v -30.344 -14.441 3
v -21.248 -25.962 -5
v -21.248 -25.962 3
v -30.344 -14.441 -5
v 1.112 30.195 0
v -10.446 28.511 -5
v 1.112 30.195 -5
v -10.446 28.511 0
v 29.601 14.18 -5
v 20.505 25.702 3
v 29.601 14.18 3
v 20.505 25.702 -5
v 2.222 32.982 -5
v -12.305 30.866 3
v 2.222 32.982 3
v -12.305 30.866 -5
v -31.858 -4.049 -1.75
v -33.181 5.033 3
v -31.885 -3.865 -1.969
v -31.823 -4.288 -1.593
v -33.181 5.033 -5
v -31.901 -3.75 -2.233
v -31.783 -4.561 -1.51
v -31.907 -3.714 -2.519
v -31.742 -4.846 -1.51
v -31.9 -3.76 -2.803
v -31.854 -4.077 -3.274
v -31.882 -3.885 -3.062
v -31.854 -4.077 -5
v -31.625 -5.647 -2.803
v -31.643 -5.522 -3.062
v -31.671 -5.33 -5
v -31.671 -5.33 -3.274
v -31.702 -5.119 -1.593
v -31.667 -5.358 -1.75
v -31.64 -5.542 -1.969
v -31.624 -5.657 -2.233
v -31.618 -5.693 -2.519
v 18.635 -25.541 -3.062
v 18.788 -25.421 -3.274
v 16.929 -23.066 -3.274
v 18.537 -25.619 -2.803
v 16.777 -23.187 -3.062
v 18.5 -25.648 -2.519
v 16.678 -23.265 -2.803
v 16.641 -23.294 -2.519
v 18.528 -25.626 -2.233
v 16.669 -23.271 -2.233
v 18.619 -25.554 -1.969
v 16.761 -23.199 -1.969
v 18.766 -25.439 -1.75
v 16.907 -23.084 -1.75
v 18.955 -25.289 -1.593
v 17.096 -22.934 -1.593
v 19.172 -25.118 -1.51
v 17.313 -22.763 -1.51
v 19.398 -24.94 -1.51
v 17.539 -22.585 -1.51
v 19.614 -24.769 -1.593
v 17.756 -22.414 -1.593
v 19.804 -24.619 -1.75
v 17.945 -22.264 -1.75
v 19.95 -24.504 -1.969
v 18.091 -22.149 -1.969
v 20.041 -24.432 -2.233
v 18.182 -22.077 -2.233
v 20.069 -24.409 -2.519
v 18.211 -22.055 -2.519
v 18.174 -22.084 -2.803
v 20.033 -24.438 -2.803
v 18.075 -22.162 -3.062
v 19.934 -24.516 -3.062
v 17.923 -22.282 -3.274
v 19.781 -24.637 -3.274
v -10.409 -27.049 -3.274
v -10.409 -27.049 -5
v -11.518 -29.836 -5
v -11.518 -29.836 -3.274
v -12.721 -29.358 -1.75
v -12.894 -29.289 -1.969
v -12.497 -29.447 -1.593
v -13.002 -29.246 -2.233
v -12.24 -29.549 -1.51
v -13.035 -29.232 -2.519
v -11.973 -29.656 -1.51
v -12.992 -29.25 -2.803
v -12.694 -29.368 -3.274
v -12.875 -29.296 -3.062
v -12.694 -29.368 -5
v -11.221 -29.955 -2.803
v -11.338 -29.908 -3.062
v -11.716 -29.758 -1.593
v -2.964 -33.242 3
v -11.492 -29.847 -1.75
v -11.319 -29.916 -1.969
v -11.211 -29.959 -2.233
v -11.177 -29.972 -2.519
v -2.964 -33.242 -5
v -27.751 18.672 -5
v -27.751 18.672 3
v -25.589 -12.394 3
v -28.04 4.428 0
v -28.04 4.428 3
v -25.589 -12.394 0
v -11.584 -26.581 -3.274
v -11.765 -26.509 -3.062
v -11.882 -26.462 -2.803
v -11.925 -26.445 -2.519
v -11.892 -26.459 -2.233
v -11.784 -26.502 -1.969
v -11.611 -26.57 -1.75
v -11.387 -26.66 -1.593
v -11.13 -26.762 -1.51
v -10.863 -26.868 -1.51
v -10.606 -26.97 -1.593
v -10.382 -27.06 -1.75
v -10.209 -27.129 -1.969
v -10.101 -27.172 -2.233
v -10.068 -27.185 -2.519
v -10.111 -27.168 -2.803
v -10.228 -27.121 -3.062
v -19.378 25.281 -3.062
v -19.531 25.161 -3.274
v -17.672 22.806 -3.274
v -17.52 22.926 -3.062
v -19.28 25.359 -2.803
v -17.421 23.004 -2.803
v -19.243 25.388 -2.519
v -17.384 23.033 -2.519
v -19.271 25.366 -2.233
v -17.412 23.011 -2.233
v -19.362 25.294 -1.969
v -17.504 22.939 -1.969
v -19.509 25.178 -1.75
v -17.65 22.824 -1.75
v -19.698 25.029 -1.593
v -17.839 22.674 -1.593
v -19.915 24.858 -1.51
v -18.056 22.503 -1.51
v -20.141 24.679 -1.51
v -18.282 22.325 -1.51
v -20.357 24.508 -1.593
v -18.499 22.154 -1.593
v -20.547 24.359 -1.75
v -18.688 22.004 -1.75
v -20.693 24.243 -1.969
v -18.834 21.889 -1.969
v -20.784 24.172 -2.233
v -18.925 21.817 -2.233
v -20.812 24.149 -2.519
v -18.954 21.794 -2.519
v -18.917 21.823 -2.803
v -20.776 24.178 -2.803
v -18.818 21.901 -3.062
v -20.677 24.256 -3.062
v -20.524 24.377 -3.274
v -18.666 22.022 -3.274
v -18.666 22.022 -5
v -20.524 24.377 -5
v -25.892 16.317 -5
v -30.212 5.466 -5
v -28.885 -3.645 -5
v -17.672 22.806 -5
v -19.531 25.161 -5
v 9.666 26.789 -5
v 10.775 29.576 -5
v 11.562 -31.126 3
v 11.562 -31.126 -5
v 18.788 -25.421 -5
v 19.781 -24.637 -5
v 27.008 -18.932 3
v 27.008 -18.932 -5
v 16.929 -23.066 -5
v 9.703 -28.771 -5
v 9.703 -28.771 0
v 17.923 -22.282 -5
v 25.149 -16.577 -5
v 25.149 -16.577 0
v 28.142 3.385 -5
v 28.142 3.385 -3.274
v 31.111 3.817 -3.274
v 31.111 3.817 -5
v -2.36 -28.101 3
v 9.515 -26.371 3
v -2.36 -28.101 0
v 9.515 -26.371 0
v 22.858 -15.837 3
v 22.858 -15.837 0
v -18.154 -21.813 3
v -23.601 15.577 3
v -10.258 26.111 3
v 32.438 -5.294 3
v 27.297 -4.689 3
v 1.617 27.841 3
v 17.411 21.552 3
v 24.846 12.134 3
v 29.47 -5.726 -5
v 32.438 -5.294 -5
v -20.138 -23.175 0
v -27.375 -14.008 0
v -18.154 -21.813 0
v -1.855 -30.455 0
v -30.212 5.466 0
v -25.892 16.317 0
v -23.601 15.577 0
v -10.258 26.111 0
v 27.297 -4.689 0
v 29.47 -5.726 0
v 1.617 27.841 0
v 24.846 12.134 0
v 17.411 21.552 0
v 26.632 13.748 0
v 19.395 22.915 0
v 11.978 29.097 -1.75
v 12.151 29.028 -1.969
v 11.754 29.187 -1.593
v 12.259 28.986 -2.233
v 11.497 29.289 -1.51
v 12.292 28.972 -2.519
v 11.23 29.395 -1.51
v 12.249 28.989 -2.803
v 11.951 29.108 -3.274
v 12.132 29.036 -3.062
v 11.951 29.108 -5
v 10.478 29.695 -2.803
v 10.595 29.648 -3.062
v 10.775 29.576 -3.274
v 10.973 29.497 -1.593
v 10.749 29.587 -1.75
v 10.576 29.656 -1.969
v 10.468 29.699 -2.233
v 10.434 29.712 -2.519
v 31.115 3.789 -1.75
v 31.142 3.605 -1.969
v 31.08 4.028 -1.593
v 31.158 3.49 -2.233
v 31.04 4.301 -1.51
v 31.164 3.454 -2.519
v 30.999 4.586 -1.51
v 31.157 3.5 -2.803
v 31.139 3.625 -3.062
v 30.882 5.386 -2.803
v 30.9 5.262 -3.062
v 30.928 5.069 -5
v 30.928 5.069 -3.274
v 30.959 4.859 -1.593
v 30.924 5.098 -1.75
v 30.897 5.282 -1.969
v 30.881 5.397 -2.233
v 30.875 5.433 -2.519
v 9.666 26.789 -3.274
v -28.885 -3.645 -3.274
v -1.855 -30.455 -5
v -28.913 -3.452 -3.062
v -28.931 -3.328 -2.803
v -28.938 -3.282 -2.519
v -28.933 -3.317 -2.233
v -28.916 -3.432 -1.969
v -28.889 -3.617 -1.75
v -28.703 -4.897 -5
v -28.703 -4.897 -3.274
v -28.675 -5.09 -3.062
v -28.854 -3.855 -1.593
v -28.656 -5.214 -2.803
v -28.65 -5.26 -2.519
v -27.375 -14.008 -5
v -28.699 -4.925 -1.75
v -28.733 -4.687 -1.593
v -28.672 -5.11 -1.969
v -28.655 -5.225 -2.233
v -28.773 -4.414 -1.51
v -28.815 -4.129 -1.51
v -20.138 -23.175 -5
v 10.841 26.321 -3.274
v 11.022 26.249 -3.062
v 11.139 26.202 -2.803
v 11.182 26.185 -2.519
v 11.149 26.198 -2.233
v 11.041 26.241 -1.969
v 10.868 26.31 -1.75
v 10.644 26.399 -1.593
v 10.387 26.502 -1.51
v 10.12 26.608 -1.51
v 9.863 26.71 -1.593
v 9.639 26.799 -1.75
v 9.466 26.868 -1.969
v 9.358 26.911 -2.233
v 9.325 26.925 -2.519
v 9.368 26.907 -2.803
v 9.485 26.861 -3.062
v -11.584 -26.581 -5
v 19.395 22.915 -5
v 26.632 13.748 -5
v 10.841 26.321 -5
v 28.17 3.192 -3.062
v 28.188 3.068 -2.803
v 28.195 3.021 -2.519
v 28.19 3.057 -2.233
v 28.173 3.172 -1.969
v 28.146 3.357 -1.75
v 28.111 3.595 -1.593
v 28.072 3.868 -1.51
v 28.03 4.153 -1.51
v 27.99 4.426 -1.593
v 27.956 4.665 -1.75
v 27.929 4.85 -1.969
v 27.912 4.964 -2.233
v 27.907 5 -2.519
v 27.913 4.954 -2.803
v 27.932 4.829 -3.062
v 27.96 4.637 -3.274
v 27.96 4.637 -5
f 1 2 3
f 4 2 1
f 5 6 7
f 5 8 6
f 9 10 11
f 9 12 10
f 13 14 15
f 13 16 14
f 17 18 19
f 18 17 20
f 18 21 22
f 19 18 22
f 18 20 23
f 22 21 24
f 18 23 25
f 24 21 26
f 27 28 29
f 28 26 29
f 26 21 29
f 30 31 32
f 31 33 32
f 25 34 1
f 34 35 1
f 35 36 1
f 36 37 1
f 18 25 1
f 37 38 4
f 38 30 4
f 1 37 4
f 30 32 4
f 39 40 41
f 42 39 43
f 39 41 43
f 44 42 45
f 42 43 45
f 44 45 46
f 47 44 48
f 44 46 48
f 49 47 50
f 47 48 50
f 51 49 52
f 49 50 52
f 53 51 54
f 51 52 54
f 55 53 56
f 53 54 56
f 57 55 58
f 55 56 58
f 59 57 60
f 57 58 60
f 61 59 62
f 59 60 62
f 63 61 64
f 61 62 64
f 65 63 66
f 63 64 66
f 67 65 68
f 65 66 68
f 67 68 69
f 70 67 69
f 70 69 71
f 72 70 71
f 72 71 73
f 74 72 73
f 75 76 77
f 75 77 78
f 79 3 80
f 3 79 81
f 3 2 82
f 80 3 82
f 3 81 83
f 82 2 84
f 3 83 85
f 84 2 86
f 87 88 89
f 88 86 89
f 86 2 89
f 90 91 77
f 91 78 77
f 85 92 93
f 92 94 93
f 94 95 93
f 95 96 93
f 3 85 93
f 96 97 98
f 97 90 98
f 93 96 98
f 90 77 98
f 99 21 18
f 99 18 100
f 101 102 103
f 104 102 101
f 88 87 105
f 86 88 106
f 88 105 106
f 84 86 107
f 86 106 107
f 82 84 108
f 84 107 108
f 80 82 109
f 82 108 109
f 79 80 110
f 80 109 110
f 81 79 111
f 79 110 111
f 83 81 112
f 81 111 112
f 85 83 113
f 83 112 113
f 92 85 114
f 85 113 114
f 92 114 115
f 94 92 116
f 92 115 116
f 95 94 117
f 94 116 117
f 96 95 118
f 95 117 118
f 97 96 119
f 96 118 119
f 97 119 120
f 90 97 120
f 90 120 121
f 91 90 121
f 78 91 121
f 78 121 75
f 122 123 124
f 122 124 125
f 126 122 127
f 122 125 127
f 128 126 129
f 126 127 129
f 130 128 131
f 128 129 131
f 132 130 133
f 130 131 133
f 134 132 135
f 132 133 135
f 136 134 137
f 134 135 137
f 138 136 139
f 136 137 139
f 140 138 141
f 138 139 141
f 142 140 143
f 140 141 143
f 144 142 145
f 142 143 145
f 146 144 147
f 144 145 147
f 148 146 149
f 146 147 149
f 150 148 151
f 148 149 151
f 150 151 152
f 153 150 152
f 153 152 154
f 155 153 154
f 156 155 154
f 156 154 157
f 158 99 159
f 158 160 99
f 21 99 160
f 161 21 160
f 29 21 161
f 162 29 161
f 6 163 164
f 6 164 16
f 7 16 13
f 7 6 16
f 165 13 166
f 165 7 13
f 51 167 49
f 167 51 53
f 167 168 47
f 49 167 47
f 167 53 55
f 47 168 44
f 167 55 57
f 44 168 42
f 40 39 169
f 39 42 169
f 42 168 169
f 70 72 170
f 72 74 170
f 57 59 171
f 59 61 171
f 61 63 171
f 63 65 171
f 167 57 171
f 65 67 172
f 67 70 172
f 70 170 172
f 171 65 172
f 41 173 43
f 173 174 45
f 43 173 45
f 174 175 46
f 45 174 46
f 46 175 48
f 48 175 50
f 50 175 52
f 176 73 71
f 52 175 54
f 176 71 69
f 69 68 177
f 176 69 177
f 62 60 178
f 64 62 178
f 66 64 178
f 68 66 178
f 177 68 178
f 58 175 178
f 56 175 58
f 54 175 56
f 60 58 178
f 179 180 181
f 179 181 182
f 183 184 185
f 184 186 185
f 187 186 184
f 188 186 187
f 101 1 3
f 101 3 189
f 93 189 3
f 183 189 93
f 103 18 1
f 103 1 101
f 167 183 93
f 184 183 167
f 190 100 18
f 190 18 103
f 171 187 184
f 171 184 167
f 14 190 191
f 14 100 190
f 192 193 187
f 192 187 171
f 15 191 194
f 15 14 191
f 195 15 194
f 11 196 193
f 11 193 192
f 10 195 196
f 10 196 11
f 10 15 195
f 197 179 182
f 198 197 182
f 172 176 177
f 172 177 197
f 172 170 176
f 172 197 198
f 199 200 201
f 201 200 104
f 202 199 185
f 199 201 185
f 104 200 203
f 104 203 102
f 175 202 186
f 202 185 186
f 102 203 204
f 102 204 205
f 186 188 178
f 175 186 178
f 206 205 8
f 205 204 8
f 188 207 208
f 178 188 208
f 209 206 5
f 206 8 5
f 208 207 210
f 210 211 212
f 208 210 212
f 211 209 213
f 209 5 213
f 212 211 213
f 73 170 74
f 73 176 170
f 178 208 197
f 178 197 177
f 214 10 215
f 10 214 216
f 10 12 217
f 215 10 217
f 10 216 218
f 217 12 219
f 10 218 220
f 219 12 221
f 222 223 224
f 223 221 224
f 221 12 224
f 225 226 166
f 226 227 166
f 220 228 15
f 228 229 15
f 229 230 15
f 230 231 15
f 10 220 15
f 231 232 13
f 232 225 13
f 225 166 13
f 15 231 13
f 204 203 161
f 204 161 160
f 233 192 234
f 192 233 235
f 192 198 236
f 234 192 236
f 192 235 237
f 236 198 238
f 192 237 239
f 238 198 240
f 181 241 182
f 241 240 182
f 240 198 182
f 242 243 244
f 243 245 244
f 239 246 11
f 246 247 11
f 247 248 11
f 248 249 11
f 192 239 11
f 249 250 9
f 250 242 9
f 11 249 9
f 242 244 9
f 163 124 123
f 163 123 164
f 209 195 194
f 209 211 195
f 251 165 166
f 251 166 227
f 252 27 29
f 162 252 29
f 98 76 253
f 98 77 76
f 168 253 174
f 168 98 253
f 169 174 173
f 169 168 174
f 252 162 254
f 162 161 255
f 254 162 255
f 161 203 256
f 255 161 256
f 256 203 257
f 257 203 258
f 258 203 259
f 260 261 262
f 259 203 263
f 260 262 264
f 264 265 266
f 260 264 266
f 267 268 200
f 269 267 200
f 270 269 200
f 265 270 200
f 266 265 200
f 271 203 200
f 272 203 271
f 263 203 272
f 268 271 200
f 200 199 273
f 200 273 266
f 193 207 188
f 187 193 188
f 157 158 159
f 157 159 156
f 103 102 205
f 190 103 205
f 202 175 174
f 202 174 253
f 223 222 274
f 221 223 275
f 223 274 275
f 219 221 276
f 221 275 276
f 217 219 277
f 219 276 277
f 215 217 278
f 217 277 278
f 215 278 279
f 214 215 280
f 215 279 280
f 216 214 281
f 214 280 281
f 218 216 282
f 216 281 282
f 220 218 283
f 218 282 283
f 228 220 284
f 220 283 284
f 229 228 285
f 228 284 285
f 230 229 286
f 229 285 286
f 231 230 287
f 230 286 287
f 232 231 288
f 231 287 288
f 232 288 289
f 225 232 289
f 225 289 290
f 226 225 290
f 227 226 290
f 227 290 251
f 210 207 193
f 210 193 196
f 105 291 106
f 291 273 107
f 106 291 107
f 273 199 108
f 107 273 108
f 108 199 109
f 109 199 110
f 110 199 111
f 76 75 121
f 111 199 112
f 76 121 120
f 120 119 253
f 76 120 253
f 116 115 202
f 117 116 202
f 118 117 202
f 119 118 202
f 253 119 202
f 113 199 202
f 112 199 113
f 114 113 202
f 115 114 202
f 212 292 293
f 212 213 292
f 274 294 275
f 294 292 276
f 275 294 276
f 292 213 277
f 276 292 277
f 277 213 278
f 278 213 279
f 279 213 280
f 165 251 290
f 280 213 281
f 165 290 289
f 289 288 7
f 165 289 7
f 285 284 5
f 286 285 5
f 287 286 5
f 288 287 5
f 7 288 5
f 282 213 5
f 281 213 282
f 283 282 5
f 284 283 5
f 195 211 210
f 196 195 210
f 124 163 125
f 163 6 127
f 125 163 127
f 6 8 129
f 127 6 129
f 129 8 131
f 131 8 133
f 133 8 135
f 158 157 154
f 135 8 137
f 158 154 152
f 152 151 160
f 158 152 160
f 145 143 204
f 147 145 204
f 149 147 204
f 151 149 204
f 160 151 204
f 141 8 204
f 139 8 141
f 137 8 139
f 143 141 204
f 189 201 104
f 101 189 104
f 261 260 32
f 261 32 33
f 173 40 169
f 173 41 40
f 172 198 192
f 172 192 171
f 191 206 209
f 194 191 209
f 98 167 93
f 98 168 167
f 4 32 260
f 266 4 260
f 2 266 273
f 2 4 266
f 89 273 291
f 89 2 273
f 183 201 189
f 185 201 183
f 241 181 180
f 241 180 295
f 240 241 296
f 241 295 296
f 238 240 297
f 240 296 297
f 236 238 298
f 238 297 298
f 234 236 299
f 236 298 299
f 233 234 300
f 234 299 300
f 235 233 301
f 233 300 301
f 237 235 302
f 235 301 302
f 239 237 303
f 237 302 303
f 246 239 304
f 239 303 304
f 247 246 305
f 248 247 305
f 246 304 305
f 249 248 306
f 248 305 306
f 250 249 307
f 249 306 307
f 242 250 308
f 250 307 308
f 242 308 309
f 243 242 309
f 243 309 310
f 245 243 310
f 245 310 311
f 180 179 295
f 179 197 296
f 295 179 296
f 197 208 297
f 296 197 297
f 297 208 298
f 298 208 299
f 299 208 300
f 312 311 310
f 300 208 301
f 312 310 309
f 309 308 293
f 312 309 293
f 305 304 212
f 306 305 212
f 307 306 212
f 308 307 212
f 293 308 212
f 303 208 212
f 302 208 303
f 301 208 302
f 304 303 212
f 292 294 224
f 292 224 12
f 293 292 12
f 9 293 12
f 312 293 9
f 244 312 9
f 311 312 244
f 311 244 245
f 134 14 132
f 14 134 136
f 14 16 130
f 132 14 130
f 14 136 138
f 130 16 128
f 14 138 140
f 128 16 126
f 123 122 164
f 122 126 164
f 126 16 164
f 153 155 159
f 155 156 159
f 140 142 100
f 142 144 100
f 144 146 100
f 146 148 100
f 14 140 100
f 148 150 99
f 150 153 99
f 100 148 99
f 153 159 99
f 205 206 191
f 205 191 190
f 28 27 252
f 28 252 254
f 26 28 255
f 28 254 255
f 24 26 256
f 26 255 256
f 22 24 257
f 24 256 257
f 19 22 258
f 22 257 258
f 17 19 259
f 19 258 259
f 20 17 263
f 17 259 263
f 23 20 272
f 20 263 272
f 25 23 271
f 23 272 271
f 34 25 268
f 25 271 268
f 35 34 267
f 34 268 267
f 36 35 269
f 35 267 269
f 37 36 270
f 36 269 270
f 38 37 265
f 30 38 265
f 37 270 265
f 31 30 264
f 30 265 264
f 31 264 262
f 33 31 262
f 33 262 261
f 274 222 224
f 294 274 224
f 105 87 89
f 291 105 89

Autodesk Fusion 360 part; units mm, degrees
sketch "Sketch1" plane through (0, 0, 0) normal (0, 0, 1) x (1, 0, 0)
  line L0 (-12.2461, -1.8602) -> (-7.8071, 9.2886)
  line L1 (-7.8071, 9.2886) -> (4.0675, 11.0187)
  line L2 (4.0675, 11.0187) -> (11.5031, 1.6)
  line L3 (11.5031, 1.6) -> (7.0641, -9.5488)
  line L4 (7.0641, -9.5488) -> (-4.8105, -11.2789)
  line L5 (-4.8105, -11.2789) -> (-12.2461, -1.8602)
  line L6 (-4.8105, -11.2789) -> (7.0641, -9.5488)
  line L7 (7.0641, -9.5488) -> (9.515, -26.3712)
  line L8 (9.515, -26.3712) -> (-2.3596, -28.1013)
  line L9 (-2.3596, -28.1013) -> (-4.8105, -11.2789)
  line L10 (7.0641, -9.5488) -> (11.5031, 1.6)
  line L11 (11.5031, 1.6) -> (27.2972, -4.6887)
  line L12 (27.2972, -4.6887) -> (22.8582, -15.8374)
  line L13 (22.8582, -15.8374) -> (7.0641, -9.5488)
  line L14 (11.5031, 1.6) -> (4.0675, 11.0187)
  line L15 (4.0675, 11.0187) -> (17.4107, 21.5524)
  line L16 (17.4107, 21.5524) -> (24.8463, 12.1337)
  line L17 (24.8463, 12.1337) -> (11.5031, 1.6)
  line L18 (4.0675, 11.0187) -> (-7.8071, 9.2886)
  line L19 (-7.8071, 9.2886) -> (-10.258, 26.111)
  line L20 (-10.258, 26.111) -> (1.6166, 27.841)
  line L21 (1.6166, 27.841) -> (4.0675, 11.0187)
  line L22 (-7.8071, 9.2886) -> (-12.2461, -1.8602)
  line L23 (-12.2461, -1.8602) -> (-28.0402, 4.4284)
  line L24 (-28.0402, 4.4284) -> (-23.6012, 15.5772)
  line L25 (-23.6012, 15.5772) -> (-7.8071, 9.2886)
  line L26 (-12.2461, -1.8602) -> (-4.8105, -11.2789)
  line L27 (-4.8105, -11.2789) -> (-18.1537, -21.8127)
  line L28 (-18.1537, -21.8127) -> (-25.5893, -12.394)
  line L29 (-25.5893, -12.394) -> (-12.2461, -1.8602)
  line L30 (-28.0402, 4.4284) -> (-25.5893, -12.394)
  line L31 (-18.1537, -21.8127) -> (-2.3596, -28.1013)
  line L32 (9.515, -26.3712) -> (22.8582, -15.8374)
  line L33 (27.2972, -4.6887) -> (24.8463, 12.1337)
  line L34 (17.4107, 21.5524) -> (1.6166, 27.841)
  line L35 (-10.258, 26.111) -> (-23.6012, 15.5772)
  line L36 (-33.1811, 5.0333) -> (-27.7509, 18.6715)
  line L37 (-12.3047, 30.8656) -> (-27.7509, 18.6715)
  line L38 (-12.3047, 30.8656) -> (2.2215, 32.982)
  line L39 (20.505, 25.7021) -> (2.2215, 32.982)
  line L40 (20.505, 25.7021) -> (29.6009, 14.1803)
  line L41 (32.4381, -5.2936) -> (29.6009, 14.1803)
  line L42 (32.4381, -5.2936) -> (27.0079, -18.9317)
  line L43 (11.5616, -31.1258) -> (27.0079, -18.9317)
  line L44 (11.5616, -31.1258) -> (-2.9645, -33.2422)
  line L45 (-21.248, -25.9624) -> (-2.9645, -33.2422)
  line L46 (-21.248, -25.9624) -> (-30.3439, -14.4406)
  line L47 (-33.1811, 5.0333) -> (-30.3439, -14.4406)
  dimension "d1" = 12
  dimension "d2" = 12
  dimension "d3" = 12
  dimension "d4" = 12
  dimension "d5" = 12
  dimension "d6" = 12
  dimension "d7" = 120
  dimension "d8" = 120
  dimension "d9" = 120
  dimension "d10" = 17
  dimension "d11" = 17
  dimension "d12" = 17
  dimension "d13" = 17
  dimension "d14" = 17
  dimension "d15" = 17
  dimension "d16" = -5
extrude "Extrude1" add sketch "Sketch1" along normal blind 3
sketch "Sketch2" plane through (0, 0, 0) normal (0, 0, -1) x (1, 0, 0)
  line L0 (17.4107, -21.5524) -> (1.6166, -27.841)
  line L1 (1.6166, -27.841) -> (-10.258, -26.111)
  line L2 (-10.258, -26.111) -> (-23.6012, -15.5772)
  line L3 (-23.6012, -15.5772) -> (-28.0402, -4.4284)
  line L4 (-28.0402, -4.4284) -> (-25.5893, 12.394)
  line L5 (-25.5893, 12.394) -> (-18.1537, 21.8127)
  line L6 (-18.1537, 21.8127) -> (-2.3596, 28.1013)
  line L7 (-2.3596, 28.1013) -> (9.515, 26.3712)
  line L8 (9.515, 26.3712) -> (22.8582, 15.8374)
  line L9 (22.8582, 15.8374) -> (27.2972, 4.6887)
  line L10 (27.2972, 4.6887) -> (24.8463, -12.1337)
  line L11 (24.8463, -12.1337) -> (17.4107, -21.5524)
  line L12 (-27.7509, -18.6715) -> (-12.3047, -30.8656)
  line L13 (-12.3047, -30.8656) -> (2.2215, -32.982)
  line L14 (2.2215, -32.982) -> (20.505, -25.7021)
  line L15 (20.505, -25.7021) -> (29.6009, -14.1803)
  line L16 (29.6009, -14.1803) -> (32.4381, 5.2936)
  line L17 (32.4381, 5.2936) -> (27.0079, 18.9317)
  line L18 (27.0079, 18.9317) -> (11.5616, 31.1258)
  line L19 (11.5616, 31.1258) -> (-2.9645, 33.2422)
  line L20 (-2.9645, 33.2422) -> (-21.248, 25.9624)
  line L21 (-21.248, 25.9624) -> (-30.3439, 14.4406)
  line L22 (-30.3439, 14.4406) -> (-33.1811, -5.0333)
  line L23 (-33.1811, -5.0333) -> (-27.7509, -18.6715)
  line L24 (-30.3439, 14.4406) -> (-33.1811, -5.0333)
  line L25 (-30.2125, -5.4658) -> (-27.3752, 14.0081)
  line L26 (-10.4458, -28.5109) -> (-25.892, -16.3168)
  line L27 (-27.7509, -18.6715) -> (-12.3047, -30.8656)
  line L28 (19.3952, -22.915) -> (1.1117, -30.1948)
  line L29 (2.2215, -32.982) -> (20.505, -25.7021)
  line L30 (29.4695, 5.7261) -> (26.6322, -13.7478)
  line L31 (29.6009, -14.1803) -> (32.4381, 5.2936)
  line L32 (9.7027, 28.7711) -> (25.149, 16.5771)
  line L33 (27.0079, 18.9317) -> (11.5616, 31.1258)
  line L34 (-20.1382, 23.1752) -> (-1.8547, 30.455)
  line L35 (-2.9645, 33.2422) -> (-21.248, 25.9624)
  line L36 (-20.1382, 23.1752) -> (-27.3752, 14.0081)
  line L37 (-30.2125, -5.4658) -> (-25.892, -16.3168)
  line L38 (-10.4458, -28.5109) -> (1.1117, -30.1948)
  line L39 (19.3952, -22.915) -> (26.6322, -13.7478)
  line L40 (29.4695, 5.7261) -> (25.149, 16.5771)
  line L41 (9.7027, 28.7711) -> (-1.8547, 30.455)
  line L42 (-30.3439, 14.4406) -> (-21.248, 25.9624)
  line L43 (-2.9645, 33.2422) -> (11.5616, 31.1258)
  line L44 (27.0079, 18.9317) -> (32.4381, 5.2936)
  line L45 (29.4695, -14.3468) -> (20.505, -25.7021)
  line L46 (2.2215, -32.982) -> (-12.3047, -30.8656)
  line L47 (-27.7509, -18.6715) -> (-33.1811, -5.0333)
  dimension "d20" = 2
extrude "Extrude2" add sketch "Sketch2" along normal blind 5 contours L12 L13 L14 L15 L16 L17 L18 L19 L20 L21 L22 L23 L24 L27 L29 L31 L33 L35 L42 L43 L44 L45 L46 L47
sketch "Sketch3" plane through (17.718, -22.4435, 0) normal (-0.6196, 0.7849, 0) x (-0.7849, -0.6196, 0)
  line L0 (10.212, 0) -> (-9.4675, 0)
  line L1 (-9.4675, 0) -> (-9.4675, -5)
  line L2 (-9.4675, -5) -> (10.212, -5)
  line L3 (10.212, -5) -> (10.212, 0)
  line L4 (1.005, -5) -> (-0.2606, -5)
  line L5 (-0.2606, -5) -> (-0.2606, -3.2743)
  line L6 (1.005, -3.2743) -> (1.005, -5)
  arc A0 (1.005, -3.2743) -> (-0.2606, -3.2743) centre (0.3722, -2.5) ccw
  point P0 (0.3722, -2.5)
  dimension "d25" = 2
extrude "Extrude3" cut sketch "Sketch3" against normal blind 7 contours L2 L4 L5 L6 A0
pattern_circular "C-Pattern1" count 6 over 360 about axis through (-0.3715, -0.1301, 1) along (0, 0, -1) of "Extrude3"
